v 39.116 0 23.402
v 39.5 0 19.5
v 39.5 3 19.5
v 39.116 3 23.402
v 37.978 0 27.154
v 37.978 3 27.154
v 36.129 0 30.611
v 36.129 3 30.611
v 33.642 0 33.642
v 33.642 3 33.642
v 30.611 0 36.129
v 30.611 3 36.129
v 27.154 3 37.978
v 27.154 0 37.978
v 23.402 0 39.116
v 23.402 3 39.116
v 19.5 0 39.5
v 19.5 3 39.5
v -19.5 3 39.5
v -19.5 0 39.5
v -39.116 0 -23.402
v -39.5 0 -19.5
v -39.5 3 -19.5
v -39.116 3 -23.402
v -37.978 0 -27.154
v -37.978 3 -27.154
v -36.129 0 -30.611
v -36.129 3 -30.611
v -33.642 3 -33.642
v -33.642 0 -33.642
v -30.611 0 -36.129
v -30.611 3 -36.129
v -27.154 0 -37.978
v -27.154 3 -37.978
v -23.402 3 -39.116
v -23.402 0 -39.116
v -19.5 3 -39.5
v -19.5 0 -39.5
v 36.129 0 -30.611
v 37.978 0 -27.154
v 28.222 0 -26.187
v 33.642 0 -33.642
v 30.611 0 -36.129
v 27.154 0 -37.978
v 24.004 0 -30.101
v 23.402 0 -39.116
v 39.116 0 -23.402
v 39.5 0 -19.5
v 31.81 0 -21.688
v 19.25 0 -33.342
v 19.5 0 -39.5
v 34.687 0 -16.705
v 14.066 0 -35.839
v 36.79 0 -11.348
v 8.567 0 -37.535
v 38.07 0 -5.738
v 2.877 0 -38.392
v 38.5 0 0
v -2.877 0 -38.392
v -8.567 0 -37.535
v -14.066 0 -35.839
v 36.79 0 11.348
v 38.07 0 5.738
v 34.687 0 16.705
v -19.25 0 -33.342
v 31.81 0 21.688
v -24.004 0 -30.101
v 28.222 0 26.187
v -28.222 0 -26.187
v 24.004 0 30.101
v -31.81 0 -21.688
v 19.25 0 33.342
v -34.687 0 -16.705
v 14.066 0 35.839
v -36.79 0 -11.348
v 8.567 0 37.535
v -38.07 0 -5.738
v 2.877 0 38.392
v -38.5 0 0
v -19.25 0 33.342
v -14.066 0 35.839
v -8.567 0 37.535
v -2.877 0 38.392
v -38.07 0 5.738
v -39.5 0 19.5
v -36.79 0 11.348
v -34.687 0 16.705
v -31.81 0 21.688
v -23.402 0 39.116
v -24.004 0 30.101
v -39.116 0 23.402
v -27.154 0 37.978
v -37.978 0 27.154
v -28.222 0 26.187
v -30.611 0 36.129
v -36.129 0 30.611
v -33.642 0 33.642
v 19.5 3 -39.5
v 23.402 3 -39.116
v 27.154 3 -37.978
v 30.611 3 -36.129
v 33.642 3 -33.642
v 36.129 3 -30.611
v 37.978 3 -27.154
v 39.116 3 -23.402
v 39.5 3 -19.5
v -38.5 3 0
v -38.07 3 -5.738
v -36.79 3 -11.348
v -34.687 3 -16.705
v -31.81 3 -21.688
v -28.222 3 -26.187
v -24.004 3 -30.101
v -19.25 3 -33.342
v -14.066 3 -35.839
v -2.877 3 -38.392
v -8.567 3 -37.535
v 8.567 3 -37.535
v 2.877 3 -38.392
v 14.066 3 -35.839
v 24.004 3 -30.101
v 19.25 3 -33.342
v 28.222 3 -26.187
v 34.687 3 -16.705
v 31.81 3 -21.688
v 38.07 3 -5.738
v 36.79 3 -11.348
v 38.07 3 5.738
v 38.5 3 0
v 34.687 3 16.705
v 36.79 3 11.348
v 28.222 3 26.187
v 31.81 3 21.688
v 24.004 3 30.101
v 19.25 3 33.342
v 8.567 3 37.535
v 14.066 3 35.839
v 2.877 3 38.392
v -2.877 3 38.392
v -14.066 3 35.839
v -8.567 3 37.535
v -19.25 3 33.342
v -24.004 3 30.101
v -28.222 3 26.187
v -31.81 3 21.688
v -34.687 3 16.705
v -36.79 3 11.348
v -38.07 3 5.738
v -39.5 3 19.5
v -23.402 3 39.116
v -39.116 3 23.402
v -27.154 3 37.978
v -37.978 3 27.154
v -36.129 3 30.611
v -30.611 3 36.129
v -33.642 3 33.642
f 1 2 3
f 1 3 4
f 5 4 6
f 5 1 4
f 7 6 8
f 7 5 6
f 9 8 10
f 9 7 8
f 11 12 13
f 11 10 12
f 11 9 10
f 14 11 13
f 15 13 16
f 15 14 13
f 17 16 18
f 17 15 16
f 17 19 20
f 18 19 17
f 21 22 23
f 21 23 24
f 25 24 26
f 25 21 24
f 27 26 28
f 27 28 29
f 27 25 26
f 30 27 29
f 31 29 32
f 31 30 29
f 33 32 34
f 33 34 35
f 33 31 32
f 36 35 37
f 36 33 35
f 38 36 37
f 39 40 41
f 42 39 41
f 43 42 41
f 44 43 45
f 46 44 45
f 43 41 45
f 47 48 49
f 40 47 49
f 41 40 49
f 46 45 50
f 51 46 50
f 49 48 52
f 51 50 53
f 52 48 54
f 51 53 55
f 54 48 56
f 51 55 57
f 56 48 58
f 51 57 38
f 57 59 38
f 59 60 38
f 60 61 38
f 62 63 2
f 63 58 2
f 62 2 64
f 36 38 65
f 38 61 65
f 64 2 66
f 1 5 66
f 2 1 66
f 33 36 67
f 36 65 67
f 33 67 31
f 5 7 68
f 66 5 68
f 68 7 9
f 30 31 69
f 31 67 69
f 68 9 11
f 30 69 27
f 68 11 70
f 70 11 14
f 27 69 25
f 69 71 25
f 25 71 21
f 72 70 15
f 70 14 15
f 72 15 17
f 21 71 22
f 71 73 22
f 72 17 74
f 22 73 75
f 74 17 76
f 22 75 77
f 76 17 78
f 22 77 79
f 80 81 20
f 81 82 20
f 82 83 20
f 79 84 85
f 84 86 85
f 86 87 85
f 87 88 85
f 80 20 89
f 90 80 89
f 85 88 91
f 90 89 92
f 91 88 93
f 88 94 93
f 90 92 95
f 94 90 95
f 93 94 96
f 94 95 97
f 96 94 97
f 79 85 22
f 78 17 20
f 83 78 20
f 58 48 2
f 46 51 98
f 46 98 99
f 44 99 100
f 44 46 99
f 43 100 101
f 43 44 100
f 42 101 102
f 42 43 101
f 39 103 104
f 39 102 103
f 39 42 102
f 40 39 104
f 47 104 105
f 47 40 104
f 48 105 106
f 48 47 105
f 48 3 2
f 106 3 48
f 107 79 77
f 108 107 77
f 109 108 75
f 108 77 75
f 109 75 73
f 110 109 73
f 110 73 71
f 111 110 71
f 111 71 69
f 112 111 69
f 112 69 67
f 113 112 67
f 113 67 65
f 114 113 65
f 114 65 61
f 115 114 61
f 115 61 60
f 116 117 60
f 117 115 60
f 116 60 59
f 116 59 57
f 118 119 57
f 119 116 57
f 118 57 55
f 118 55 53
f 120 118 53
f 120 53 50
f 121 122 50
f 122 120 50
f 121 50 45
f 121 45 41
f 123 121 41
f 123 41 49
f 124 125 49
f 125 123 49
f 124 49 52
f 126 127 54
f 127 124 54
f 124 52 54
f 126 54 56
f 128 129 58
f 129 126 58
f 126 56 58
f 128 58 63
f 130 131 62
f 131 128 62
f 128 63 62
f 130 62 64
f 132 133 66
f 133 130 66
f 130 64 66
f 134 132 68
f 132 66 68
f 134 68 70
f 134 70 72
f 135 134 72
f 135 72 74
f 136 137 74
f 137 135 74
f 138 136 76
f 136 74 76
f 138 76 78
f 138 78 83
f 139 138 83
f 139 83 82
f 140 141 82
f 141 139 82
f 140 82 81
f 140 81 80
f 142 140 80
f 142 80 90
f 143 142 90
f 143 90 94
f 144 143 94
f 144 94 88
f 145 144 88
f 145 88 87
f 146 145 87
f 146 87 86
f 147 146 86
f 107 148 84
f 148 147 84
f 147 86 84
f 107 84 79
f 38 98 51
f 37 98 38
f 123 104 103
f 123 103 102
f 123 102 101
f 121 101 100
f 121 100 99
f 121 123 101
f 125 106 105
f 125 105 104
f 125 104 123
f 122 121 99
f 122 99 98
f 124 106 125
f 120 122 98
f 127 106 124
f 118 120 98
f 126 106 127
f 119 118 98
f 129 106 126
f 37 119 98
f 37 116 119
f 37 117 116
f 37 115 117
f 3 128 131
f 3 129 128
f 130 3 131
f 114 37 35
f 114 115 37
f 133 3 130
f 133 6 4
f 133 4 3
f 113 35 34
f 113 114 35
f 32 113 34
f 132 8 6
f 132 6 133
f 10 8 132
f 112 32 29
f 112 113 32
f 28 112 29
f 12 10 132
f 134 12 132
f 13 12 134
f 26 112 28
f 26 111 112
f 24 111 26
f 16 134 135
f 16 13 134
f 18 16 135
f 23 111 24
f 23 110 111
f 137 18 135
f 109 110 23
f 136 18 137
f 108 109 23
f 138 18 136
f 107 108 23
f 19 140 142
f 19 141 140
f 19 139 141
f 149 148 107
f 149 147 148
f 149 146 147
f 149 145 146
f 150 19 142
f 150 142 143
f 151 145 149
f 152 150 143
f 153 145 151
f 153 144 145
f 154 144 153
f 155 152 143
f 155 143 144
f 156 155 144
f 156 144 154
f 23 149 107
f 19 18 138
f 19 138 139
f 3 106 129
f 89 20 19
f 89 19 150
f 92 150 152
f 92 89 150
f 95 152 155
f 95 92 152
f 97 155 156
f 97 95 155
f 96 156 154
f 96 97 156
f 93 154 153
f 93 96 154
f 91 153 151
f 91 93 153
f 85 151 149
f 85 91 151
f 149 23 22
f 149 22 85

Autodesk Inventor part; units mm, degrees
ref_plane "YZ Plane" through (0, 0, 0) normal (1, 0, 0) x (0, 1, 0)
ref_plane "XZ Plane" through (0, 0, 0) normal (0, 1, 0) x (-1, 0, 0)
ref_plane "XY Plane" through (0, 0, 0) normal (0, 0, 1) x (1, 0, 0)
sketch "Sketch1" plane through (0, 0, 0) normal (0, 1, 0) x (-1, 0, 0)
  circle A0 centre (0, 0) radius 38.5
  circle A1 centre (0, 0) radius 39.5
  dimension "d0" = 77
  dimension "d1" = 79
extrude "Extrusion1" add sketch "Sketch1" along normal blind 3
sketch "Sketch21" plane through (0, 3, 0) normal (0, 1, 0) x (1, 0, 0)
  line L0 (-39.5, -39.5) -> (39.5, -39.5)
  line L1 (39.5, -39.5) -> (39.5, 39.5)
  line L2 (39.5, 39.5) -> (-39.5, 39.5)
  line L3 (-39.5, 39.5) -> (-39.5, -39.5)
  line L4 (-39.5, -39.5) -> (39.5, 39.5) construction
  line L5 (39.5, -39.5) -> (-39.5, 39.5) construction
  circle A0 centre (0, 0) radius 39.5
  dimension "d111" = 79
  dimension "d112" = 79
extrude "Extrusion21" add sketch "Sketch21" against normal blind 3 contours L3 A0 L0 | A0 L1 L0 | L3 L2 A0 | A0 L2 L1
fillet "Fillet3" radius 20 4 edges at (-39.5, 1.5, -39.5) (39.5, 1.5, -39.5) (39.5, 1.5, 39.5) (-39.5, 1.5, 39.5)
properties part number "Motor mount (plain)"
